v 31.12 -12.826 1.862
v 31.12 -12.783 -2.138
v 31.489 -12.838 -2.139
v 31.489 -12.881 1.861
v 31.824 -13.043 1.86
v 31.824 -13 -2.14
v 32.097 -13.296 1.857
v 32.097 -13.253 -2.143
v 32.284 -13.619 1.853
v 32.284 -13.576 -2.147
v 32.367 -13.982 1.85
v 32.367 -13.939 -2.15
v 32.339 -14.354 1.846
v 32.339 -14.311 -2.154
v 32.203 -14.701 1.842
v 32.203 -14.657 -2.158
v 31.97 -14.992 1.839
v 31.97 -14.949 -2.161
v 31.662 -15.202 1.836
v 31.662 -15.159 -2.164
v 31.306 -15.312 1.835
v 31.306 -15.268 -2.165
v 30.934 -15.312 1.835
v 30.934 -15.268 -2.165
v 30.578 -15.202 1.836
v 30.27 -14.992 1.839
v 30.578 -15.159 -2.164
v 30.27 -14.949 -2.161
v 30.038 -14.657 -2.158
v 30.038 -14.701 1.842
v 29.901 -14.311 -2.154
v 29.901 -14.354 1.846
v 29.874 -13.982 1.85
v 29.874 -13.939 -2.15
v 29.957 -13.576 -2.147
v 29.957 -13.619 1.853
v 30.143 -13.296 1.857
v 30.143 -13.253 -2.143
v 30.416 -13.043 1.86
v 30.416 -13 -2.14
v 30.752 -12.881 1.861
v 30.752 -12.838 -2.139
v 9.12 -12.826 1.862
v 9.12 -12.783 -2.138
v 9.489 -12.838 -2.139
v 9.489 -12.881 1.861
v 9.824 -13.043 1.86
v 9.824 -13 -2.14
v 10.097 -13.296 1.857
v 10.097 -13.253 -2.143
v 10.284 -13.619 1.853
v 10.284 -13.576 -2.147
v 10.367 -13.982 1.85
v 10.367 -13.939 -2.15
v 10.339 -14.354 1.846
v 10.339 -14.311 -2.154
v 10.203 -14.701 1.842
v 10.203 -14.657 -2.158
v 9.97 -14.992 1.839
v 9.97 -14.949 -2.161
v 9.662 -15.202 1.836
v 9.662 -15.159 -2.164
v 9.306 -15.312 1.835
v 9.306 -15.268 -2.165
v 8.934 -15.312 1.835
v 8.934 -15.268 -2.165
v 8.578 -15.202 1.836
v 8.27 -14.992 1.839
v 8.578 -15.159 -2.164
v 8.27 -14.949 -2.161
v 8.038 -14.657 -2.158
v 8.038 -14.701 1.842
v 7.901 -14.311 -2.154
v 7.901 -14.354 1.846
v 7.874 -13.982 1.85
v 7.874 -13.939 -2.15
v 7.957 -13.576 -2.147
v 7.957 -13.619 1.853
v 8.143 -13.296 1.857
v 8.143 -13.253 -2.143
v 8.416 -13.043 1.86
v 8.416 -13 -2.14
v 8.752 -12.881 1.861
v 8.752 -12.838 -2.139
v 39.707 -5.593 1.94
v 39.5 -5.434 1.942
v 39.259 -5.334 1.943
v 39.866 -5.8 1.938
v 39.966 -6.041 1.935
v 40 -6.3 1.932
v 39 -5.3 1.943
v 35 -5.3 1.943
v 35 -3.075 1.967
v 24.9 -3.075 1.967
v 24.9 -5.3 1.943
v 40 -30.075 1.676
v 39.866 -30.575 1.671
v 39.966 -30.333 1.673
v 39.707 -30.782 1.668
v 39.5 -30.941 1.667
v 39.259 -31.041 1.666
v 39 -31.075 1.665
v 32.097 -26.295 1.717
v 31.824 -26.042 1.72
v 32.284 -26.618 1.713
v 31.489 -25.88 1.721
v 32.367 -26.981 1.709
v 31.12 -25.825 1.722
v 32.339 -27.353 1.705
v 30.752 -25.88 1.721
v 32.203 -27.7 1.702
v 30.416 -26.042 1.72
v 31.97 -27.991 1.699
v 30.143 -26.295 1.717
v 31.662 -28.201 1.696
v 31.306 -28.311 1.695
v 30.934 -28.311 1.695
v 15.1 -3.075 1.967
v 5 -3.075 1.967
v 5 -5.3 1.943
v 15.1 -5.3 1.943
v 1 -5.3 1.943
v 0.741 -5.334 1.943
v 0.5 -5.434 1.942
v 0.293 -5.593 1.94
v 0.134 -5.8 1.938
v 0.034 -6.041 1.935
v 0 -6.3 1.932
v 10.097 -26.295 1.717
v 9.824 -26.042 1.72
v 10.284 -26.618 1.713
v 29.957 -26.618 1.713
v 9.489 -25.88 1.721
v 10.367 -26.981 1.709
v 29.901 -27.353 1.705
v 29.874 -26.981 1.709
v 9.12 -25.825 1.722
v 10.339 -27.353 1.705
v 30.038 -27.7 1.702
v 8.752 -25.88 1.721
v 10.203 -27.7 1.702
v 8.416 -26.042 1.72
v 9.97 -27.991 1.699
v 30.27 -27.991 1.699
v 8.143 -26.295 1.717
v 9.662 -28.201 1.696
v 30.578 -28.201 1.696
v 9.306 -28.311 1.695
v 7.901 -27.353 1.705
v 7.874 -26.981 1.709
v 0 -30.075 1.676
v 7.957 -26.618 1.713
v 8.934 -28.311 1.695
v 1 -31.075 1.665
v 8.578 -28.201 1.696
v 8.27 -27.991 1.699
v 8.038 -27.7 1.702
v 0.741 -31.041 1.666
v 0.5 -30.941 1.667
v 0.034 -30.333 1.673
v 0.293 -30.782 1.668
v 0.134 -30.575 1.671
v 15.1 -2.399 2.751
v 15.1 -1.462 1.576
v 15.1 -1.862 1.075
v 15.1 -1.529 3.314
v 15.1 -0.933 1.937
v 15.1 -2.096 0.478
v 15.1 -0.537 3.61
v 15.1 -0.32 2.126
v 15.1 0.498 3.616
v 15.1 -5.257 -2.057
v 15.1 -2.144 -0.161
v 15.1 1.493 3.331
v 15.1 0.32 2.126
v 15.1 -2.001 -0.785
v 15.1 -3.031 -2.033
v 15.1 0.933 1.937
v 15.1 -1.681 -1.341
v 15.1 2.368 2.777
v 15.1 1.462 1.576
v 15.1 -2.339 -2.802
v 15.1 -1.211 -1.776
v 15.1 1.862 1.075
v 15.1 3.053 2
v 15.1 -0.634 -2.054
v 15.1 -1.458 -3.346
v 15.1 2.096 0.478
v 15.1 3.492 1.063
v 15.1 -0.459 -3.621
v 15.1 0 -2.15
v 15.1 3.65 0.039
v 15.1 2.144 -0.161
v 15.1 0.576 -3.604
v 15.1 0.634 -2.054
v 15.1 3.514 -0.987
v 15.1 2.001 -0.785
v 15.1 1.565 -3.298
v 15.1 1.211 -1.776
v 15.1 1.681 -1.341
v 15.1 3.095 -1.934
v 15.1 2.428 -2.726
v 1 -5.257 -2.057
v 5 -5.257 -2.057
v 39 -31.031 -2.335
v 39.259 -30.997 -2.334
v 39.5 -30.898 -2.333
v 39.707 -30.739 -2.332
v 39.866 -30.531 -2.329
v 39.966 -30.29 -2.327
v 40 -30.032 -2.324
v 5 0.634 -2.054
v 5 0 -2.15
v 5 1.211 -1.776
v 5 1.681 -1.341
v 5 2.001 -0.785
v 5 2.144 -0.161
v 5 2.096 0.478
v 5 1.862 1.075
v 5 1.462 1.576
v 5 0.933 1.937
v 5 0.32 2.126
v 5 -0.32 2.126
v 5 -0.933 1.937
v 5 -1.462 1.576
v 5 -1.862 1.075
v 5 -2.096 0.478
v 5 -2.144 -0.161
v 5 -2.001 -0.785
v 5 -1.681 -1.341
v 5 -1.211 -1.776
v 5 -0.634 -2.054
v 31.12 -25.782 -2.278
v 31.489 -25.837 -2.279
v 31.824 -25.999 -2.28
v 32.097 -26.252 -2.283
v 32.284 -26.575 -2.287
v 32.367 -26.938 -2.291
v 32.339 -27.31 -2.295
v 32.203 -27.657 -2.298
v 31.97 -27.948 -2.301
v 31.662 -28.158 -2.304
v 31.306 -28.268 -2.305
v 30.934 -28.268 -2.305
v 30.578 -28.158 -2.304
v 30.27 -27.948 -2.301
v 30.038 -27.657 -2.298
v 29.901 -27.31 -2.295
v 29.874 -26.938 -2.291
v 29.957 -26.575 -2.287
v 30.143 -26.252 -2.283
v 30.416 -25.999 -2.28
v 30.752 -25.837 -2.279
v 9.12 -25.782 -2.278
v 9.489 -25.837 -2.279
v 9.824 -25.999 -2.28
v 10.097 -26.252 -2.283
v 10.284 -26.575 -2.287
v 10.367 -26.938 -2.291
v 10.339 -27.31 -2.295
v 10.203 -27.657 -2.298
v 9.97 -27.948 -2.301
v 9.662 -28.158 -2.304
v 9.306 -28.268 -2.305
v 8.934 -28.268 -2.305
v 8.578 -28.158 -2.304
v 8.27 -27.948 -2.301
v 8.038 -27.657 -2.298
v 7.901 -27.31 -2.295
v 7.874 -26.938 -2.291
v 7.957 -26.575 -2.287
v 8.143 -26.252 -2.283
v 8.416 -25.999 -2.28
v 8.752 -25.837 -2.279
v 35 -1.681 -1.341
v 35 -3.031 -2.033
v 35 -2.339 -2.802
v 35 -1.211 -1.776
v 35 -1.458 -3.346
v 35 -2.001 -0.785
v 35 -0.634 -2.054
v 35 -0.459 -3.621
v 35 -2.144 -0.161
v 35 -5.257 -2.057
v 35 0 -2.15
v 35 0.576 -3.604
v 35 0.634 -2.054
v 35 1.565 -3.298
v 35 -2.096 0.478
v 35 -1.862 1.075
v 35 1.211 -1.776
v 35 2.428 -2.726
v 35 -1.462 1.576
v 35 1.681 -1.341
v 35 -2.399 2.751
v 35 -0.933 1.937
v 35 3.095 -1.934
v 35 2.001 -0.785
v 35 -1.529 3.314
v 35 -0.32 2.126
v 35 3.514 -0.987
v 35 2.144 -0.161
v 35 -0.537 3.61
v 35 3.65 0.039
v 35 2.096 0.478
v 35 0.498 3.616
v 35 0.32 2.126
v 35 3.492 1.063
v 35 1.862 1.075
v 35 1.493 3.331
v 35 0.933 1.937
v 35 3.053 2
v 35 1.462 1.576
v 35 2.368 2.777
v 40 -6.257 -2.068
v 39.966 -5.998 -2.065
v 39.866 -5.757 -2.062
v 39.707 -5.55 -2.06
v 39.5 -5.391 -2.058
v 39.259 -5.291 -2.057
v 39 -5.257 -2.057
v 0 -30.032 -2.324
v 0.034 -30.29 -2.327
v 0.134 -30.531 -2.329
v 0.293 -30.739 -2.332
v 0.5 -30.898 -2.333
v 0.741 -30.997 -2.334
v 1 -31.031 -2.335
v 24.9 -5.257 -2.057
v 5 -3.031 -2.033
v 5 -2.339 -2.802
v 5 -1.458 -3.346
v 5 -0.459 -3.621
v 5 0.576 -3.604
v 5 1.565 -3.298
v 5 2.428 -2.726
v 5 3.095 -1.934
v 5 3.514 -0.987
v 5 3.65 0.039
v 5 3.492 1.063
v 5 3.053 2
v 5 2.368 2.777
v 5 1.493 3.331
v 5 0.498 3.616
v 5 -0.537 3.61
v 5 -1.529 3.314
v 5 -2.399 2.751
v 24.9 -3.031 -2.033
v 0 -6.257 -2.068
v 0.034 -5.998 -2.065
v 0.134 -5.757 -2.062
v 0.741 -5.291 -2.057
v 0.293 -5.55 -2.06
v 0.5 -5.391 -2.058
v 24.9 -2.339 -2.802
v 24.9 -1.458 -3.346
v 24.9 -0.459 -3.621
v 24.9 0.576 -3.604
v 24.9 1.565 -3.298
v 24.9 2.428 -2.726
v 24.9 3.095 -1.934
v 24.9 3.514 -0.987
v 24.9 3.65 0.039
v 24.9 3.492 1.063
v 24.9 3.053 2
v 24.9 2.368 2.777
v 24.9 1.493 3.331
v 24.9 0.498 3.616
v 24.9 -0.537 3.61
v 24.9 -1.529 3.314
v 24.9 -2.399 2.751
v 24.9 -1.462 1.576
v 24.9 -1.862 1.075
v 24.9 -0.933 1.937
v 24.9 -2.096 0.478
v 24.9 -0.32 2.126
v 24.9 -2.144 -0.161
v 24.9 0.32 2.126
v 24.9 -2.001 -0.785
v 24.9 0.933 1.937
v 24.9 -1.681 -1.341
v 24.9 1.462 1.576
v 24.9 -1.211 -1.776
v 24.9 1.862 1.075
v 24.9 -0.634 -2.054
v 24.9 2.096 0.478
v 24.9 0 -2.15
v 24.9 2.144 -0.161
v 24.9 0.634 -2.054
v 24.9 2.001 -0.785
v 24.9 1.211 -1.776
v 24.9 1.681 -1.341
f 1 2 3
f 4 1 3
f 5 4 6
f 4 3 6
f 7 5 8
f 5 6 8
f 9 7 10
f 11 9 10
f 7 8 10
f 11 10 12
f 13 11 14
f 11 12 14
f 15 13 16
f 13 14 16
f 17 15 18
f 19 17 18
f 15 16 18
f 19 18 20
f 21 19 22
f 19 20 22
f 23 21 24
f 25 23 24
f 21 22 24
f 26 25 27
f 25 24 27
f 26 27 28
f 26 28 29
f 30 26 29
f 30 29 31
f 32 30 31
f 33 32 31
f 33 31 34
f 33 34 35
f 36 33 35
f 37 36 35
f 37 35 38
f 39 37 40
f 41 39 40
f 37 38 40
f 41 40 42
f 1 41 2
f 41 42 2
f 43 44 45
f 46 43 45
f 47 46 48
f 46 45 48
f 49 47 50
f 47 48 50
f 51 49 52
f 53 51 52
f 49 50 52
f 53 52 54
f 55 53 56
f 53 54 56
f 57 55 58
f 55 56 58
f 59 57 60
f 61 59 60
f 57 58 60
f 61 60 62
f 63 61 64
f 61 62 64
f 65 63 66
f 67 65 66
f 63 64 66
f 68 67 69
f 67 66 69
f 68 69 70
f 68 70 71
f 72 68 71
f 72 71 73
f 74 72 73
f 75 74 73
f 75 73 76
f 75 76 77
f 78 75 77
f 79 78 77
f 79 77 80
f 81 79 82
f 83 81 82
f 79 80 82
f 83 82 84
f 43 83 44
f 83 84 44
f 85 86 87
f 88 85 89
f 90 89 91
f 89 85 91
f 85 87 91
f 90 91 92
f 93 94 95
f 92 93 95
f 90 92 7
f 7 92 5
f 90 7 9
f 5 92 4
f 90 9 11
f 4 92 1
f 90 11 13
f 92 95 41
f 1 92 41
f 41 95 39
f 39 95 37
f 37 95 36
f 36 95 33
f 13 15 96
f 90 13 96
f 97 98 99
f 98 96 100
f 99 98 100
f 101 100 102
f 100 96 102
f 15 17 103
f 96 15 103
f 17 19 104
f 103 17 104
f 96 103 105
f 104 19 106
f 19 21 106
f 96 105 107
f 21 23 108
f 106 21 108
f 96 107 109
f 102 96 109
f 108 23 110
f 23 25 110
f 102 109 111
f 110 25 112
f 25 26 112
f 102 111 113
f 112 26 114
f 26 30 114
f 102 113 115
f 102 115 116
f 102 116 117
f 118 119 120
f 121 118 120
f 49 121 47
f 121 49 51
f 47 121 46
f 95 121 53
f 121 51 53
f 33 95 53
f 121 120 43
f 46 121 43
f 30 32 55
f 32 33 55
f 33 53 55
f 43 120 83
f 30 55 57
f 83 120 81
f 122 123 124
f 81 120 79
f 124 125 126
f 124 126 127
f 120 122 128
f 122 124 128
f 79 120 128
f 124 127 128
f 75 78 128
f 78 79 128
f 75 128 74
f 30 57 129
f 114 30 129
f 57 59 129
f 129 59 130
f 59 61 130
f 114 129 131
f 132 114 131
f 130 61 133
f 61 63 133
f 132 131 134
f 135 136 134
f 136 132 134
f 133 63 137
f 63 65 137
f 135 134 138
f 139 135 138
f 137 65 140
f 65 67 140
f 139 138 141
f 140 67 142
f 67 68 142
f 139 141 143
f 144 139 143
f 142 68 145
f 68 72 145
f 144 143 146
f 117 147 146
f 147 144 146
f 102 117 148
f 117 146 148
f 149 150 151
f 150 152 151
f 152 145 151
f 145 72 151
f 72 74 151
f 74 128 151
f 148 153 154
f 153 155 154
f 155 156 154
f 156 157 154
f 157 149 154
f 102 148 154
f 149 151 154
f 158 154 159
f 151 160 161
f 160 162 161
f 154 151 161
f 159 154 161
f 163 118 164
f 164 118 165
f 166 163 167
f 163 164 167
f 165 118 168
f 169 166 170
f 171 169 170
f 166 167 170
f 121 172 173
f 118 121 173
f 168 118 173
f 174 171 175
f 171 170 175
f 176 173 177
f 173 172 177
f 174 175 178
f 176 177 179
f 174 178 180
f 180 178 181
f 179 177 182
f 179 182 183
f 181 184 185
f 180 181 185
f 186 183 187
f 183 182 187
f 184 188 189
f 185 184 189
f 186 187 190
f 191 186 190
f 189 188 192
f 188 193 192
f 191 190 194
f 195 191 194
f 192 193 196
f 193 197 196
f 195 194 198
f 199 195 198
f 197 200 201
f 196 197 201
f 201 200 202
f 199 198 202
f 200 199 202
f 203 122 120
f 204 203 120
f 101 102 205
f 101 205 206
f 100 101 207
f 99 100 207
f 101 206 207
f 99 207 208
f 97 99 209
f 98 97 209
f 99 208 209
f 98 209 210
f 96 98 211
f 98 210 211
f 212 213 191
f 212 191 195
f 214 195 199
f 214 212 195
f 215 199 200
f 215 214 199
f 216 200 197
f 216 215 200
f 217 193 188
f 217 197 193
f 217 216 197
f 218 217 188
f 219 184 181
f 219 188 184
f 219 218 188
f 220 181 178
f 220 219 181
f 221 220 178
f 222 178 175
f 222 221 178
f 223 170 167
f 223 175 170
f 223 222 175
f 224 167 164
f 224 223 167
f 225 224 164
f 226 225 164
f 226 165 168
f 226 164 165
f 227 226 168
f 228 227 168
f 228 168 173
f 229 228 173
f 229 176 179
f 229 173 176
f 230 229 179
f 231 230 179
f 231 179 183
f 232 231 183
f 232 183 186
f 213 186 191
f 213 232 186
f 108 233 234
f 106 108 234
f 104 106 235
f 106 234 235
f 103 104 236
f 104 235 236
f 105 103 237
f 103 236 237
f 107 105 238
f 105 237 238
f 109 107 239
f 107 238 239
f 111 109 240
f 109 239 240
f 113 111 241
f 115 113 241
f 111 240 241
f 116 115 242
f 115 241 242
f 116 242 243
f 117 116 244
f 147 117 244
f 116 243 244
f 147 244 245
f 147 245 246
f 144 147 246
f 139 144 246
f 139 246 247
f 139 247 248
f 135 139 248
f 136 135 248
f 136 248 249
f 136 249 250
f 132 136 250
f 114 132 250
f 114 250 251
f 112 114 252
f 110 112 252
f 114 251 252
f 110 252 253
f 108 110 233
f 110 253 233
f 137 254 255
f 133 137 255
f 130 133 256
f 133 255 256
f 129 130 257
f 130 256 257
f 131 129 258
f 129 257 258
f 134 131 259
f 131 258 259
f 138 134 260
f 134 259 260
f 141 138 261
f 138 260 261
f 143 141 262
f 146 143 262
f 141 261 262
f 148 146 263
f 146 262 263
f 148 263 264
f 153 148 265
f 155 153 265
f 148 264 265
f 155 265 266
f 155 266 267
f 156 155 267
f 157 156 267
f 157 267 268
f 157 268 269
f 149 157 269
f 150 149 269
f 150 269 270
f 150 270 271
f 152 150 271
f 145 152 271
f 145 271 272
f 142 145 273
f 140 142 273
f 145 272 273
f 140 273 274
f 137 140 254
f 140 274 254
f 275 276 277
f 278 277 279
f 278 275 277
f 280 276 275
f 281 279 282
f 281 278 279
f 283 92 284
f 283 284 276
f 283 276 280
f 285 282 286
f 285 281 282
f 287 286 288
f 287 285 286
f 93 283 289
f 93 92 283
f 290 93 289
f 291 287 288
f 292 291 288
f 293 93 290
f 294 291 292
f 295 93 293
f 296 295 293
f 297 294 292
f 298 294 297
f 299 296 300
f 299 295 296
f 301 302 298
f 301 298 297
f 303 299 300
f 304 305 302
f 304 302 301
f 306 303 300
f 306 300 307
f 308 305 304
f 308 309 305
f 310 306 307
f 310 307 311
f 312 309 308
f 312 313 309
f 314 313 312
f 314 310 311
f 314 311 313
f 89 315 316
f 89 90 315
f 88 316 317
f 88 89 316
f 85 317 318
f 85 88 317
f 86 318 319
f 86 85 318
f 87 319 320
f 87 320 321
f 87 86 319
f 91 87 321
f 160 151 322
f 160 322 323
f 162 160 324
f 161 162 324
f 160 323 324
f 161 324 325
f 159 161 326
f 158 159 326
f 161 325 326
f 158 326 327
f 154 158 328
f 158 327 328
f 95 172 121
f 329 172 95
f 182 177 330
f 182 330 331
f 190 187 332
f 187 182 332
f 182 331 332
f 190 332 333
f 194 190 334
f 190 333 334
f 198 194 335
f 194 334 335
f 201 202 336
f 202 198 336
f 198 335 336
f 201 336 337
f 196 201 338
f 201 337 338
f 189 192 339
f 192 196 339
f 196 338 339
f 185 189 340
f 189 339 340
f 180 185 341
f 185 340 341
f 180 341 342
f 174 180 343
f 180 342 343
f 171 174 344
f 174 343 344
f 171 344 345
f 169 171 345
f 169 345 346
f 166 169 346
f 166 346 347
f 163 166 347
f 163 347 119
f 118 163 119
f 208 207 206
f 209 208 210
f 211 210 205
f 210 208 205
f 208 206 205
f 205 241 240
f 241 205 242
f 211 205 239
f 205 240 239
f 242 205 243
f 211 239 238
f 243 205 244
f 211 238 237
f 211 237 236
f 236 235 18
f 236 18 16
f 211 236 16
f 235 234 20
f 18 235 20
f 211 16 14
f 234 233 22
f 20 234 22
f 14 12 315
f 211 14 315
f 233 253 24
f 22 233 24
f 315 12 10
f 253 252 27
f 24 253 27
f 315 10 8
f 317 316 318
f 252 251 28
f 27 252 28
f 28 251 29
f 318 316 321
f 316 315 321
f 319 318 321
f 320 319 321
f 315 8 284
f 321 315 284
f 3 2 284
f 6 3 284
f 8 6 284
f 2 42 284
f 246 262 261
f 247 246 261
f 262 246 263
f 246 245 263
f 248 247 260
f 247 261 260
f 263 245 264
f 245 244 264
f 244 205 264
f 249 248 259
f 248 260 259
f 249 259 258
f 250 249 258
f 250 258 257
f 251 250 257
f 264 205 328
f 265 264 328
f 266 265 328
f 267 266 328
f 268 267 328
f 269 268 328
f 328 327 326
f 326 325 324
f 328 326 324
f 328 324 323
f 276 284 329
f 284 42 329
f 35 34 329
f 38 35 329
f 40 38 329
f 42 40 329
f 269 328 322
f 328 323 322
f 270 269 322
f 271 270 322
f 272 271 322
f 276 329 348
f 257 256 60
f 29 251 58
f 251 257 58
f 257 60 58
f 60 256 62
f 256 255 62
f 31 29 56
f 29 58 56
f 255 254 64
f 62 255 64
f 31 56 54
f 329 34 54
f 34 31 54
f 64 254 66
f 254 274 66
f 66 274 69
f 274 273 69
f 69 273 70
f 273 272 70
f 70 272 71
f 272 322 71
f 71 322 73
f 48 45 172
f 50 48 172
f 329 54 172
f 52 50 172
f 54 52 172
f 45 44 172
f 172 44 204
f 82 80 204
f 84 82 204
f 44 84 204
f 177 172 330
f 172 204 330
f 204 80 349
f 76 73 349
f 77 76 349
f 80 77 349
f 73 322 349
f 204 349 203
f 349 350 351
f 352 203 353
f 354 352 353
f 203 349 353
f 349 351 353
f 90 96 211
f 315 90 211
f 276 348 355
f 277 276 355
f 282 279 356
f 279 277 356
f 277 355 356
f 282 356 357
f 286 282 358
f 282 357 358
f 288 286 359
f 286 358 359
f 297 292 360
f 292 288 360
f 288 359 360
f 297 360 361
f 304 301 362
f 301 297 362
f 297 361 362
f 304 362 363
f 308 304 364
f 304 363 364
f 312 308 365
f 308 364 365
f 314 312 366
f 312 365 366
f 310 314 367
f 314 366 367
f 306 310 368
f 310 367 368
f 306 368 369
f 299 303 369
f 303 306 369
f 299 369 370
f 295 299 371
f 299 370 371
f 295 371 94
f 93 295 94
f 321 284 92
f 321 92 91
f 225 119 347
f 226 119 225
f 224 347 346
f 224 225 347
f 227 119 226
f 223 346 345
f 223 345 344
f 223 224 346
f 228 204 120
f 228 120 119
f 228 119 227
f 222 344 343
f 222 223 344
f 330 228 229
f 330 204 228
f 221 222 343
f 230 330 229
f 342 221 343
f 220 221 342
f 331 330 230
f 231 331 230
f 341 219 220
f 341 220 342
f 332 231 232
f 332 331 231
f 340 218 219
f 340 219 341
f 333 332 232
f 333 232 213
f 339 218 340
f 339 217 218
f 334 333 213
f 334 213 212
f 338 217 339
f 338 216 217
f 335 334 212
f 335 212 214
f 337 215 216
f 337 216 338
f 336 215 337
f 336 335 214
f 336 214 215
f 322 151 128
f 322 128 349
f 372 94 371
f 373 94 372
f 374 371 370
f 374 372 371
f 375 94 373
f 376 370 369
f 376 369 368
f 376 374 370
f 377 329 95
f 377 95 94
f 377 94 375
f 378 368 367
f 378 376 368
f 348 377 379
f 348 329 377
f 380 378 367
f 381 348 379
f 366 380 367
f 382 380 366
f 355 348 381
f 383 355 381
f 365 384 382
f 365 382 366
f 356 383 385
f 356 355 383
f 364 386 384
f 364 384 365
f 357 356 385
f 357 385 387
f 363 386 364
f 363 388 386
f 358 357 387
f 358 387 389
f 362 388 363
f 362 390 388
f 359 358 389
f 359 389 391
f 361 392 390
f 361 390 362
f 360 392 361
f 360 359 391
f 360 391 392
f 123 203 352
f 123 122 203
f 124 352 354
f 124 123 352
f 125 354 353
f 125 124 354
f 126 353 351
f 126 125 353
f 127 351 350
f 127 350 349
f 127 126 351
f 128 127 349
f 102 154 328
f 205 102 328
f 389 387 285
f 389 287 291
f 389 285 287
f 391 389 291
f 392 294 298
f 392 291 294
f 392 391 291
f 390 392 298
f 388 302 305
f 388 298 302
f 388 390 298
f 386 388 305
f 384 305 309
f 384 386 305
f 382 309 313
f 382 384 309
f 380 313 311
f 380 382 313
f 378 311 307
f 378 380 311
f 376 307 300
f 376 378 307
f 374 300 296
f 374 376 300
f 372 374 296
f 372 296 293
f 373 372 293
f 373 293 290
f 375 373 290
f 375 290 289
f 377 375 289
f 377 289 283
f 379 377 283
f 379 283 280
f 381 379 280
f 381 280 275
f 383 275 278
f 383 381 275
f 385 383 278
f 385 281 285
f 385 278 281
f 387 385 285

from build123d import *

# Parameters (mm, degrees)
SKETCH_1_R          = 2.15
EXTRUDE_1_DEPTH     = 40
SKETCH_3_R          = 1.25
CUT_EXTRUDE_2_DEPTH = 4.000232305
SKETCH_2_W          = 5
SKETCH_2_H          = 10
SKETCH_2_W_2        = 9.8
CUT_EXTRUDE_3_DEPTH = 11
FILLET_1_R          = 1


with BuildPart() as part:
    # 草图1 → 凸台-拉伸1 (new body)
    with BuildSketch(Plane(origin=(0, 0, 0), x_dir=(0, 0, -1), z_dir=(1, 0, 0))):
        with BuildLine():
            Line((-1.96709588, -3.074578638), (-1.665324422, -31.074578638))
            Line((-1.665324422, -31.074578638), (2.334675578, -31.031468429))
            Line((2.334675578, -31.031468429), (2.03290412, -3.031468429))
            ThreePointArc((2.03290412, -3.031468429), (-0.039335781, 3.649788034), (-1.96709588, -3.074578638))
        make_face()
        Circle(SKETCH_1_R, mode=Mode.SUBTRACT)
    extrude(amount=EXTRUDE_1_DEPTH)

    # 草图3 → 切除-拉伸2 (cut)
    with BuildSketch(Plane(origin=(0, 0.021555104, -2), x_dir=(-1, 0, 0), z_dir=(0, 0.010776926175386807, -0.9999419272448828))):
        with Locations(Location((-31.120103863, -27.054826973, 0), (0, 0, 90))):
            Circle(SKETCH_3_R)
        with Locations(Location((-31.120103863, -14.054826973, 0), (0, 0, 90))):
            Circle(SKETCH_3_R)
        with Locations(Location((-9.120103863, -27.054826973, 0), (0, 0, 90))):
            Circle(SKETCH_3_R)
        with Locations(Location((-9.120103863, -14.054826973, 0), (0, 0, 90))):
            Circle(SKETCH_3_R)
    extrude(amount=-CUT_EXTRUDE_2_DEPTH, mode=Mode.SUBTRACT)

    # 草图2 → 切除-拉伸3 (cut, symmetric)
    with BuildSketch(Plane(origin=(0, -0.021555104, 2), x_dir=(1, 0, 0), z_dir=(0, -0.010776926175386815, 0.9999419272448828))):
        with Locations((2.5, -0.278741266)):
            Rectangle(SKETCH_2_W, SKETCH_2_H)
        with Locations((20, -0.278741266)):
            Rectangle(SKETCH_2_W_2, SKETCH_2_H)
        with Locations((37.5, -0.278741266)):
            Rectangle(SKETCH_2_W, SKETCH_2_H)
    extrude(amount=CUT_EXTRUDE_3_DEPTH, both=True, mode=Mode.SUBTRACT)

    # 圆角1
    fillet_1_edges = [part.edges().sort_by_distance(p)[0] for p in [
        (40, -31.053023534, -0.334675578),
        (0, -5.278434715, -0.056888605),
        (0, -31.053023534, -0.334675578),
        (40, -5.278434715, -0.056888605),
    ]]
    fillet(fillet_1_edges, radius=FILLET_1_R)


solid = part.part
